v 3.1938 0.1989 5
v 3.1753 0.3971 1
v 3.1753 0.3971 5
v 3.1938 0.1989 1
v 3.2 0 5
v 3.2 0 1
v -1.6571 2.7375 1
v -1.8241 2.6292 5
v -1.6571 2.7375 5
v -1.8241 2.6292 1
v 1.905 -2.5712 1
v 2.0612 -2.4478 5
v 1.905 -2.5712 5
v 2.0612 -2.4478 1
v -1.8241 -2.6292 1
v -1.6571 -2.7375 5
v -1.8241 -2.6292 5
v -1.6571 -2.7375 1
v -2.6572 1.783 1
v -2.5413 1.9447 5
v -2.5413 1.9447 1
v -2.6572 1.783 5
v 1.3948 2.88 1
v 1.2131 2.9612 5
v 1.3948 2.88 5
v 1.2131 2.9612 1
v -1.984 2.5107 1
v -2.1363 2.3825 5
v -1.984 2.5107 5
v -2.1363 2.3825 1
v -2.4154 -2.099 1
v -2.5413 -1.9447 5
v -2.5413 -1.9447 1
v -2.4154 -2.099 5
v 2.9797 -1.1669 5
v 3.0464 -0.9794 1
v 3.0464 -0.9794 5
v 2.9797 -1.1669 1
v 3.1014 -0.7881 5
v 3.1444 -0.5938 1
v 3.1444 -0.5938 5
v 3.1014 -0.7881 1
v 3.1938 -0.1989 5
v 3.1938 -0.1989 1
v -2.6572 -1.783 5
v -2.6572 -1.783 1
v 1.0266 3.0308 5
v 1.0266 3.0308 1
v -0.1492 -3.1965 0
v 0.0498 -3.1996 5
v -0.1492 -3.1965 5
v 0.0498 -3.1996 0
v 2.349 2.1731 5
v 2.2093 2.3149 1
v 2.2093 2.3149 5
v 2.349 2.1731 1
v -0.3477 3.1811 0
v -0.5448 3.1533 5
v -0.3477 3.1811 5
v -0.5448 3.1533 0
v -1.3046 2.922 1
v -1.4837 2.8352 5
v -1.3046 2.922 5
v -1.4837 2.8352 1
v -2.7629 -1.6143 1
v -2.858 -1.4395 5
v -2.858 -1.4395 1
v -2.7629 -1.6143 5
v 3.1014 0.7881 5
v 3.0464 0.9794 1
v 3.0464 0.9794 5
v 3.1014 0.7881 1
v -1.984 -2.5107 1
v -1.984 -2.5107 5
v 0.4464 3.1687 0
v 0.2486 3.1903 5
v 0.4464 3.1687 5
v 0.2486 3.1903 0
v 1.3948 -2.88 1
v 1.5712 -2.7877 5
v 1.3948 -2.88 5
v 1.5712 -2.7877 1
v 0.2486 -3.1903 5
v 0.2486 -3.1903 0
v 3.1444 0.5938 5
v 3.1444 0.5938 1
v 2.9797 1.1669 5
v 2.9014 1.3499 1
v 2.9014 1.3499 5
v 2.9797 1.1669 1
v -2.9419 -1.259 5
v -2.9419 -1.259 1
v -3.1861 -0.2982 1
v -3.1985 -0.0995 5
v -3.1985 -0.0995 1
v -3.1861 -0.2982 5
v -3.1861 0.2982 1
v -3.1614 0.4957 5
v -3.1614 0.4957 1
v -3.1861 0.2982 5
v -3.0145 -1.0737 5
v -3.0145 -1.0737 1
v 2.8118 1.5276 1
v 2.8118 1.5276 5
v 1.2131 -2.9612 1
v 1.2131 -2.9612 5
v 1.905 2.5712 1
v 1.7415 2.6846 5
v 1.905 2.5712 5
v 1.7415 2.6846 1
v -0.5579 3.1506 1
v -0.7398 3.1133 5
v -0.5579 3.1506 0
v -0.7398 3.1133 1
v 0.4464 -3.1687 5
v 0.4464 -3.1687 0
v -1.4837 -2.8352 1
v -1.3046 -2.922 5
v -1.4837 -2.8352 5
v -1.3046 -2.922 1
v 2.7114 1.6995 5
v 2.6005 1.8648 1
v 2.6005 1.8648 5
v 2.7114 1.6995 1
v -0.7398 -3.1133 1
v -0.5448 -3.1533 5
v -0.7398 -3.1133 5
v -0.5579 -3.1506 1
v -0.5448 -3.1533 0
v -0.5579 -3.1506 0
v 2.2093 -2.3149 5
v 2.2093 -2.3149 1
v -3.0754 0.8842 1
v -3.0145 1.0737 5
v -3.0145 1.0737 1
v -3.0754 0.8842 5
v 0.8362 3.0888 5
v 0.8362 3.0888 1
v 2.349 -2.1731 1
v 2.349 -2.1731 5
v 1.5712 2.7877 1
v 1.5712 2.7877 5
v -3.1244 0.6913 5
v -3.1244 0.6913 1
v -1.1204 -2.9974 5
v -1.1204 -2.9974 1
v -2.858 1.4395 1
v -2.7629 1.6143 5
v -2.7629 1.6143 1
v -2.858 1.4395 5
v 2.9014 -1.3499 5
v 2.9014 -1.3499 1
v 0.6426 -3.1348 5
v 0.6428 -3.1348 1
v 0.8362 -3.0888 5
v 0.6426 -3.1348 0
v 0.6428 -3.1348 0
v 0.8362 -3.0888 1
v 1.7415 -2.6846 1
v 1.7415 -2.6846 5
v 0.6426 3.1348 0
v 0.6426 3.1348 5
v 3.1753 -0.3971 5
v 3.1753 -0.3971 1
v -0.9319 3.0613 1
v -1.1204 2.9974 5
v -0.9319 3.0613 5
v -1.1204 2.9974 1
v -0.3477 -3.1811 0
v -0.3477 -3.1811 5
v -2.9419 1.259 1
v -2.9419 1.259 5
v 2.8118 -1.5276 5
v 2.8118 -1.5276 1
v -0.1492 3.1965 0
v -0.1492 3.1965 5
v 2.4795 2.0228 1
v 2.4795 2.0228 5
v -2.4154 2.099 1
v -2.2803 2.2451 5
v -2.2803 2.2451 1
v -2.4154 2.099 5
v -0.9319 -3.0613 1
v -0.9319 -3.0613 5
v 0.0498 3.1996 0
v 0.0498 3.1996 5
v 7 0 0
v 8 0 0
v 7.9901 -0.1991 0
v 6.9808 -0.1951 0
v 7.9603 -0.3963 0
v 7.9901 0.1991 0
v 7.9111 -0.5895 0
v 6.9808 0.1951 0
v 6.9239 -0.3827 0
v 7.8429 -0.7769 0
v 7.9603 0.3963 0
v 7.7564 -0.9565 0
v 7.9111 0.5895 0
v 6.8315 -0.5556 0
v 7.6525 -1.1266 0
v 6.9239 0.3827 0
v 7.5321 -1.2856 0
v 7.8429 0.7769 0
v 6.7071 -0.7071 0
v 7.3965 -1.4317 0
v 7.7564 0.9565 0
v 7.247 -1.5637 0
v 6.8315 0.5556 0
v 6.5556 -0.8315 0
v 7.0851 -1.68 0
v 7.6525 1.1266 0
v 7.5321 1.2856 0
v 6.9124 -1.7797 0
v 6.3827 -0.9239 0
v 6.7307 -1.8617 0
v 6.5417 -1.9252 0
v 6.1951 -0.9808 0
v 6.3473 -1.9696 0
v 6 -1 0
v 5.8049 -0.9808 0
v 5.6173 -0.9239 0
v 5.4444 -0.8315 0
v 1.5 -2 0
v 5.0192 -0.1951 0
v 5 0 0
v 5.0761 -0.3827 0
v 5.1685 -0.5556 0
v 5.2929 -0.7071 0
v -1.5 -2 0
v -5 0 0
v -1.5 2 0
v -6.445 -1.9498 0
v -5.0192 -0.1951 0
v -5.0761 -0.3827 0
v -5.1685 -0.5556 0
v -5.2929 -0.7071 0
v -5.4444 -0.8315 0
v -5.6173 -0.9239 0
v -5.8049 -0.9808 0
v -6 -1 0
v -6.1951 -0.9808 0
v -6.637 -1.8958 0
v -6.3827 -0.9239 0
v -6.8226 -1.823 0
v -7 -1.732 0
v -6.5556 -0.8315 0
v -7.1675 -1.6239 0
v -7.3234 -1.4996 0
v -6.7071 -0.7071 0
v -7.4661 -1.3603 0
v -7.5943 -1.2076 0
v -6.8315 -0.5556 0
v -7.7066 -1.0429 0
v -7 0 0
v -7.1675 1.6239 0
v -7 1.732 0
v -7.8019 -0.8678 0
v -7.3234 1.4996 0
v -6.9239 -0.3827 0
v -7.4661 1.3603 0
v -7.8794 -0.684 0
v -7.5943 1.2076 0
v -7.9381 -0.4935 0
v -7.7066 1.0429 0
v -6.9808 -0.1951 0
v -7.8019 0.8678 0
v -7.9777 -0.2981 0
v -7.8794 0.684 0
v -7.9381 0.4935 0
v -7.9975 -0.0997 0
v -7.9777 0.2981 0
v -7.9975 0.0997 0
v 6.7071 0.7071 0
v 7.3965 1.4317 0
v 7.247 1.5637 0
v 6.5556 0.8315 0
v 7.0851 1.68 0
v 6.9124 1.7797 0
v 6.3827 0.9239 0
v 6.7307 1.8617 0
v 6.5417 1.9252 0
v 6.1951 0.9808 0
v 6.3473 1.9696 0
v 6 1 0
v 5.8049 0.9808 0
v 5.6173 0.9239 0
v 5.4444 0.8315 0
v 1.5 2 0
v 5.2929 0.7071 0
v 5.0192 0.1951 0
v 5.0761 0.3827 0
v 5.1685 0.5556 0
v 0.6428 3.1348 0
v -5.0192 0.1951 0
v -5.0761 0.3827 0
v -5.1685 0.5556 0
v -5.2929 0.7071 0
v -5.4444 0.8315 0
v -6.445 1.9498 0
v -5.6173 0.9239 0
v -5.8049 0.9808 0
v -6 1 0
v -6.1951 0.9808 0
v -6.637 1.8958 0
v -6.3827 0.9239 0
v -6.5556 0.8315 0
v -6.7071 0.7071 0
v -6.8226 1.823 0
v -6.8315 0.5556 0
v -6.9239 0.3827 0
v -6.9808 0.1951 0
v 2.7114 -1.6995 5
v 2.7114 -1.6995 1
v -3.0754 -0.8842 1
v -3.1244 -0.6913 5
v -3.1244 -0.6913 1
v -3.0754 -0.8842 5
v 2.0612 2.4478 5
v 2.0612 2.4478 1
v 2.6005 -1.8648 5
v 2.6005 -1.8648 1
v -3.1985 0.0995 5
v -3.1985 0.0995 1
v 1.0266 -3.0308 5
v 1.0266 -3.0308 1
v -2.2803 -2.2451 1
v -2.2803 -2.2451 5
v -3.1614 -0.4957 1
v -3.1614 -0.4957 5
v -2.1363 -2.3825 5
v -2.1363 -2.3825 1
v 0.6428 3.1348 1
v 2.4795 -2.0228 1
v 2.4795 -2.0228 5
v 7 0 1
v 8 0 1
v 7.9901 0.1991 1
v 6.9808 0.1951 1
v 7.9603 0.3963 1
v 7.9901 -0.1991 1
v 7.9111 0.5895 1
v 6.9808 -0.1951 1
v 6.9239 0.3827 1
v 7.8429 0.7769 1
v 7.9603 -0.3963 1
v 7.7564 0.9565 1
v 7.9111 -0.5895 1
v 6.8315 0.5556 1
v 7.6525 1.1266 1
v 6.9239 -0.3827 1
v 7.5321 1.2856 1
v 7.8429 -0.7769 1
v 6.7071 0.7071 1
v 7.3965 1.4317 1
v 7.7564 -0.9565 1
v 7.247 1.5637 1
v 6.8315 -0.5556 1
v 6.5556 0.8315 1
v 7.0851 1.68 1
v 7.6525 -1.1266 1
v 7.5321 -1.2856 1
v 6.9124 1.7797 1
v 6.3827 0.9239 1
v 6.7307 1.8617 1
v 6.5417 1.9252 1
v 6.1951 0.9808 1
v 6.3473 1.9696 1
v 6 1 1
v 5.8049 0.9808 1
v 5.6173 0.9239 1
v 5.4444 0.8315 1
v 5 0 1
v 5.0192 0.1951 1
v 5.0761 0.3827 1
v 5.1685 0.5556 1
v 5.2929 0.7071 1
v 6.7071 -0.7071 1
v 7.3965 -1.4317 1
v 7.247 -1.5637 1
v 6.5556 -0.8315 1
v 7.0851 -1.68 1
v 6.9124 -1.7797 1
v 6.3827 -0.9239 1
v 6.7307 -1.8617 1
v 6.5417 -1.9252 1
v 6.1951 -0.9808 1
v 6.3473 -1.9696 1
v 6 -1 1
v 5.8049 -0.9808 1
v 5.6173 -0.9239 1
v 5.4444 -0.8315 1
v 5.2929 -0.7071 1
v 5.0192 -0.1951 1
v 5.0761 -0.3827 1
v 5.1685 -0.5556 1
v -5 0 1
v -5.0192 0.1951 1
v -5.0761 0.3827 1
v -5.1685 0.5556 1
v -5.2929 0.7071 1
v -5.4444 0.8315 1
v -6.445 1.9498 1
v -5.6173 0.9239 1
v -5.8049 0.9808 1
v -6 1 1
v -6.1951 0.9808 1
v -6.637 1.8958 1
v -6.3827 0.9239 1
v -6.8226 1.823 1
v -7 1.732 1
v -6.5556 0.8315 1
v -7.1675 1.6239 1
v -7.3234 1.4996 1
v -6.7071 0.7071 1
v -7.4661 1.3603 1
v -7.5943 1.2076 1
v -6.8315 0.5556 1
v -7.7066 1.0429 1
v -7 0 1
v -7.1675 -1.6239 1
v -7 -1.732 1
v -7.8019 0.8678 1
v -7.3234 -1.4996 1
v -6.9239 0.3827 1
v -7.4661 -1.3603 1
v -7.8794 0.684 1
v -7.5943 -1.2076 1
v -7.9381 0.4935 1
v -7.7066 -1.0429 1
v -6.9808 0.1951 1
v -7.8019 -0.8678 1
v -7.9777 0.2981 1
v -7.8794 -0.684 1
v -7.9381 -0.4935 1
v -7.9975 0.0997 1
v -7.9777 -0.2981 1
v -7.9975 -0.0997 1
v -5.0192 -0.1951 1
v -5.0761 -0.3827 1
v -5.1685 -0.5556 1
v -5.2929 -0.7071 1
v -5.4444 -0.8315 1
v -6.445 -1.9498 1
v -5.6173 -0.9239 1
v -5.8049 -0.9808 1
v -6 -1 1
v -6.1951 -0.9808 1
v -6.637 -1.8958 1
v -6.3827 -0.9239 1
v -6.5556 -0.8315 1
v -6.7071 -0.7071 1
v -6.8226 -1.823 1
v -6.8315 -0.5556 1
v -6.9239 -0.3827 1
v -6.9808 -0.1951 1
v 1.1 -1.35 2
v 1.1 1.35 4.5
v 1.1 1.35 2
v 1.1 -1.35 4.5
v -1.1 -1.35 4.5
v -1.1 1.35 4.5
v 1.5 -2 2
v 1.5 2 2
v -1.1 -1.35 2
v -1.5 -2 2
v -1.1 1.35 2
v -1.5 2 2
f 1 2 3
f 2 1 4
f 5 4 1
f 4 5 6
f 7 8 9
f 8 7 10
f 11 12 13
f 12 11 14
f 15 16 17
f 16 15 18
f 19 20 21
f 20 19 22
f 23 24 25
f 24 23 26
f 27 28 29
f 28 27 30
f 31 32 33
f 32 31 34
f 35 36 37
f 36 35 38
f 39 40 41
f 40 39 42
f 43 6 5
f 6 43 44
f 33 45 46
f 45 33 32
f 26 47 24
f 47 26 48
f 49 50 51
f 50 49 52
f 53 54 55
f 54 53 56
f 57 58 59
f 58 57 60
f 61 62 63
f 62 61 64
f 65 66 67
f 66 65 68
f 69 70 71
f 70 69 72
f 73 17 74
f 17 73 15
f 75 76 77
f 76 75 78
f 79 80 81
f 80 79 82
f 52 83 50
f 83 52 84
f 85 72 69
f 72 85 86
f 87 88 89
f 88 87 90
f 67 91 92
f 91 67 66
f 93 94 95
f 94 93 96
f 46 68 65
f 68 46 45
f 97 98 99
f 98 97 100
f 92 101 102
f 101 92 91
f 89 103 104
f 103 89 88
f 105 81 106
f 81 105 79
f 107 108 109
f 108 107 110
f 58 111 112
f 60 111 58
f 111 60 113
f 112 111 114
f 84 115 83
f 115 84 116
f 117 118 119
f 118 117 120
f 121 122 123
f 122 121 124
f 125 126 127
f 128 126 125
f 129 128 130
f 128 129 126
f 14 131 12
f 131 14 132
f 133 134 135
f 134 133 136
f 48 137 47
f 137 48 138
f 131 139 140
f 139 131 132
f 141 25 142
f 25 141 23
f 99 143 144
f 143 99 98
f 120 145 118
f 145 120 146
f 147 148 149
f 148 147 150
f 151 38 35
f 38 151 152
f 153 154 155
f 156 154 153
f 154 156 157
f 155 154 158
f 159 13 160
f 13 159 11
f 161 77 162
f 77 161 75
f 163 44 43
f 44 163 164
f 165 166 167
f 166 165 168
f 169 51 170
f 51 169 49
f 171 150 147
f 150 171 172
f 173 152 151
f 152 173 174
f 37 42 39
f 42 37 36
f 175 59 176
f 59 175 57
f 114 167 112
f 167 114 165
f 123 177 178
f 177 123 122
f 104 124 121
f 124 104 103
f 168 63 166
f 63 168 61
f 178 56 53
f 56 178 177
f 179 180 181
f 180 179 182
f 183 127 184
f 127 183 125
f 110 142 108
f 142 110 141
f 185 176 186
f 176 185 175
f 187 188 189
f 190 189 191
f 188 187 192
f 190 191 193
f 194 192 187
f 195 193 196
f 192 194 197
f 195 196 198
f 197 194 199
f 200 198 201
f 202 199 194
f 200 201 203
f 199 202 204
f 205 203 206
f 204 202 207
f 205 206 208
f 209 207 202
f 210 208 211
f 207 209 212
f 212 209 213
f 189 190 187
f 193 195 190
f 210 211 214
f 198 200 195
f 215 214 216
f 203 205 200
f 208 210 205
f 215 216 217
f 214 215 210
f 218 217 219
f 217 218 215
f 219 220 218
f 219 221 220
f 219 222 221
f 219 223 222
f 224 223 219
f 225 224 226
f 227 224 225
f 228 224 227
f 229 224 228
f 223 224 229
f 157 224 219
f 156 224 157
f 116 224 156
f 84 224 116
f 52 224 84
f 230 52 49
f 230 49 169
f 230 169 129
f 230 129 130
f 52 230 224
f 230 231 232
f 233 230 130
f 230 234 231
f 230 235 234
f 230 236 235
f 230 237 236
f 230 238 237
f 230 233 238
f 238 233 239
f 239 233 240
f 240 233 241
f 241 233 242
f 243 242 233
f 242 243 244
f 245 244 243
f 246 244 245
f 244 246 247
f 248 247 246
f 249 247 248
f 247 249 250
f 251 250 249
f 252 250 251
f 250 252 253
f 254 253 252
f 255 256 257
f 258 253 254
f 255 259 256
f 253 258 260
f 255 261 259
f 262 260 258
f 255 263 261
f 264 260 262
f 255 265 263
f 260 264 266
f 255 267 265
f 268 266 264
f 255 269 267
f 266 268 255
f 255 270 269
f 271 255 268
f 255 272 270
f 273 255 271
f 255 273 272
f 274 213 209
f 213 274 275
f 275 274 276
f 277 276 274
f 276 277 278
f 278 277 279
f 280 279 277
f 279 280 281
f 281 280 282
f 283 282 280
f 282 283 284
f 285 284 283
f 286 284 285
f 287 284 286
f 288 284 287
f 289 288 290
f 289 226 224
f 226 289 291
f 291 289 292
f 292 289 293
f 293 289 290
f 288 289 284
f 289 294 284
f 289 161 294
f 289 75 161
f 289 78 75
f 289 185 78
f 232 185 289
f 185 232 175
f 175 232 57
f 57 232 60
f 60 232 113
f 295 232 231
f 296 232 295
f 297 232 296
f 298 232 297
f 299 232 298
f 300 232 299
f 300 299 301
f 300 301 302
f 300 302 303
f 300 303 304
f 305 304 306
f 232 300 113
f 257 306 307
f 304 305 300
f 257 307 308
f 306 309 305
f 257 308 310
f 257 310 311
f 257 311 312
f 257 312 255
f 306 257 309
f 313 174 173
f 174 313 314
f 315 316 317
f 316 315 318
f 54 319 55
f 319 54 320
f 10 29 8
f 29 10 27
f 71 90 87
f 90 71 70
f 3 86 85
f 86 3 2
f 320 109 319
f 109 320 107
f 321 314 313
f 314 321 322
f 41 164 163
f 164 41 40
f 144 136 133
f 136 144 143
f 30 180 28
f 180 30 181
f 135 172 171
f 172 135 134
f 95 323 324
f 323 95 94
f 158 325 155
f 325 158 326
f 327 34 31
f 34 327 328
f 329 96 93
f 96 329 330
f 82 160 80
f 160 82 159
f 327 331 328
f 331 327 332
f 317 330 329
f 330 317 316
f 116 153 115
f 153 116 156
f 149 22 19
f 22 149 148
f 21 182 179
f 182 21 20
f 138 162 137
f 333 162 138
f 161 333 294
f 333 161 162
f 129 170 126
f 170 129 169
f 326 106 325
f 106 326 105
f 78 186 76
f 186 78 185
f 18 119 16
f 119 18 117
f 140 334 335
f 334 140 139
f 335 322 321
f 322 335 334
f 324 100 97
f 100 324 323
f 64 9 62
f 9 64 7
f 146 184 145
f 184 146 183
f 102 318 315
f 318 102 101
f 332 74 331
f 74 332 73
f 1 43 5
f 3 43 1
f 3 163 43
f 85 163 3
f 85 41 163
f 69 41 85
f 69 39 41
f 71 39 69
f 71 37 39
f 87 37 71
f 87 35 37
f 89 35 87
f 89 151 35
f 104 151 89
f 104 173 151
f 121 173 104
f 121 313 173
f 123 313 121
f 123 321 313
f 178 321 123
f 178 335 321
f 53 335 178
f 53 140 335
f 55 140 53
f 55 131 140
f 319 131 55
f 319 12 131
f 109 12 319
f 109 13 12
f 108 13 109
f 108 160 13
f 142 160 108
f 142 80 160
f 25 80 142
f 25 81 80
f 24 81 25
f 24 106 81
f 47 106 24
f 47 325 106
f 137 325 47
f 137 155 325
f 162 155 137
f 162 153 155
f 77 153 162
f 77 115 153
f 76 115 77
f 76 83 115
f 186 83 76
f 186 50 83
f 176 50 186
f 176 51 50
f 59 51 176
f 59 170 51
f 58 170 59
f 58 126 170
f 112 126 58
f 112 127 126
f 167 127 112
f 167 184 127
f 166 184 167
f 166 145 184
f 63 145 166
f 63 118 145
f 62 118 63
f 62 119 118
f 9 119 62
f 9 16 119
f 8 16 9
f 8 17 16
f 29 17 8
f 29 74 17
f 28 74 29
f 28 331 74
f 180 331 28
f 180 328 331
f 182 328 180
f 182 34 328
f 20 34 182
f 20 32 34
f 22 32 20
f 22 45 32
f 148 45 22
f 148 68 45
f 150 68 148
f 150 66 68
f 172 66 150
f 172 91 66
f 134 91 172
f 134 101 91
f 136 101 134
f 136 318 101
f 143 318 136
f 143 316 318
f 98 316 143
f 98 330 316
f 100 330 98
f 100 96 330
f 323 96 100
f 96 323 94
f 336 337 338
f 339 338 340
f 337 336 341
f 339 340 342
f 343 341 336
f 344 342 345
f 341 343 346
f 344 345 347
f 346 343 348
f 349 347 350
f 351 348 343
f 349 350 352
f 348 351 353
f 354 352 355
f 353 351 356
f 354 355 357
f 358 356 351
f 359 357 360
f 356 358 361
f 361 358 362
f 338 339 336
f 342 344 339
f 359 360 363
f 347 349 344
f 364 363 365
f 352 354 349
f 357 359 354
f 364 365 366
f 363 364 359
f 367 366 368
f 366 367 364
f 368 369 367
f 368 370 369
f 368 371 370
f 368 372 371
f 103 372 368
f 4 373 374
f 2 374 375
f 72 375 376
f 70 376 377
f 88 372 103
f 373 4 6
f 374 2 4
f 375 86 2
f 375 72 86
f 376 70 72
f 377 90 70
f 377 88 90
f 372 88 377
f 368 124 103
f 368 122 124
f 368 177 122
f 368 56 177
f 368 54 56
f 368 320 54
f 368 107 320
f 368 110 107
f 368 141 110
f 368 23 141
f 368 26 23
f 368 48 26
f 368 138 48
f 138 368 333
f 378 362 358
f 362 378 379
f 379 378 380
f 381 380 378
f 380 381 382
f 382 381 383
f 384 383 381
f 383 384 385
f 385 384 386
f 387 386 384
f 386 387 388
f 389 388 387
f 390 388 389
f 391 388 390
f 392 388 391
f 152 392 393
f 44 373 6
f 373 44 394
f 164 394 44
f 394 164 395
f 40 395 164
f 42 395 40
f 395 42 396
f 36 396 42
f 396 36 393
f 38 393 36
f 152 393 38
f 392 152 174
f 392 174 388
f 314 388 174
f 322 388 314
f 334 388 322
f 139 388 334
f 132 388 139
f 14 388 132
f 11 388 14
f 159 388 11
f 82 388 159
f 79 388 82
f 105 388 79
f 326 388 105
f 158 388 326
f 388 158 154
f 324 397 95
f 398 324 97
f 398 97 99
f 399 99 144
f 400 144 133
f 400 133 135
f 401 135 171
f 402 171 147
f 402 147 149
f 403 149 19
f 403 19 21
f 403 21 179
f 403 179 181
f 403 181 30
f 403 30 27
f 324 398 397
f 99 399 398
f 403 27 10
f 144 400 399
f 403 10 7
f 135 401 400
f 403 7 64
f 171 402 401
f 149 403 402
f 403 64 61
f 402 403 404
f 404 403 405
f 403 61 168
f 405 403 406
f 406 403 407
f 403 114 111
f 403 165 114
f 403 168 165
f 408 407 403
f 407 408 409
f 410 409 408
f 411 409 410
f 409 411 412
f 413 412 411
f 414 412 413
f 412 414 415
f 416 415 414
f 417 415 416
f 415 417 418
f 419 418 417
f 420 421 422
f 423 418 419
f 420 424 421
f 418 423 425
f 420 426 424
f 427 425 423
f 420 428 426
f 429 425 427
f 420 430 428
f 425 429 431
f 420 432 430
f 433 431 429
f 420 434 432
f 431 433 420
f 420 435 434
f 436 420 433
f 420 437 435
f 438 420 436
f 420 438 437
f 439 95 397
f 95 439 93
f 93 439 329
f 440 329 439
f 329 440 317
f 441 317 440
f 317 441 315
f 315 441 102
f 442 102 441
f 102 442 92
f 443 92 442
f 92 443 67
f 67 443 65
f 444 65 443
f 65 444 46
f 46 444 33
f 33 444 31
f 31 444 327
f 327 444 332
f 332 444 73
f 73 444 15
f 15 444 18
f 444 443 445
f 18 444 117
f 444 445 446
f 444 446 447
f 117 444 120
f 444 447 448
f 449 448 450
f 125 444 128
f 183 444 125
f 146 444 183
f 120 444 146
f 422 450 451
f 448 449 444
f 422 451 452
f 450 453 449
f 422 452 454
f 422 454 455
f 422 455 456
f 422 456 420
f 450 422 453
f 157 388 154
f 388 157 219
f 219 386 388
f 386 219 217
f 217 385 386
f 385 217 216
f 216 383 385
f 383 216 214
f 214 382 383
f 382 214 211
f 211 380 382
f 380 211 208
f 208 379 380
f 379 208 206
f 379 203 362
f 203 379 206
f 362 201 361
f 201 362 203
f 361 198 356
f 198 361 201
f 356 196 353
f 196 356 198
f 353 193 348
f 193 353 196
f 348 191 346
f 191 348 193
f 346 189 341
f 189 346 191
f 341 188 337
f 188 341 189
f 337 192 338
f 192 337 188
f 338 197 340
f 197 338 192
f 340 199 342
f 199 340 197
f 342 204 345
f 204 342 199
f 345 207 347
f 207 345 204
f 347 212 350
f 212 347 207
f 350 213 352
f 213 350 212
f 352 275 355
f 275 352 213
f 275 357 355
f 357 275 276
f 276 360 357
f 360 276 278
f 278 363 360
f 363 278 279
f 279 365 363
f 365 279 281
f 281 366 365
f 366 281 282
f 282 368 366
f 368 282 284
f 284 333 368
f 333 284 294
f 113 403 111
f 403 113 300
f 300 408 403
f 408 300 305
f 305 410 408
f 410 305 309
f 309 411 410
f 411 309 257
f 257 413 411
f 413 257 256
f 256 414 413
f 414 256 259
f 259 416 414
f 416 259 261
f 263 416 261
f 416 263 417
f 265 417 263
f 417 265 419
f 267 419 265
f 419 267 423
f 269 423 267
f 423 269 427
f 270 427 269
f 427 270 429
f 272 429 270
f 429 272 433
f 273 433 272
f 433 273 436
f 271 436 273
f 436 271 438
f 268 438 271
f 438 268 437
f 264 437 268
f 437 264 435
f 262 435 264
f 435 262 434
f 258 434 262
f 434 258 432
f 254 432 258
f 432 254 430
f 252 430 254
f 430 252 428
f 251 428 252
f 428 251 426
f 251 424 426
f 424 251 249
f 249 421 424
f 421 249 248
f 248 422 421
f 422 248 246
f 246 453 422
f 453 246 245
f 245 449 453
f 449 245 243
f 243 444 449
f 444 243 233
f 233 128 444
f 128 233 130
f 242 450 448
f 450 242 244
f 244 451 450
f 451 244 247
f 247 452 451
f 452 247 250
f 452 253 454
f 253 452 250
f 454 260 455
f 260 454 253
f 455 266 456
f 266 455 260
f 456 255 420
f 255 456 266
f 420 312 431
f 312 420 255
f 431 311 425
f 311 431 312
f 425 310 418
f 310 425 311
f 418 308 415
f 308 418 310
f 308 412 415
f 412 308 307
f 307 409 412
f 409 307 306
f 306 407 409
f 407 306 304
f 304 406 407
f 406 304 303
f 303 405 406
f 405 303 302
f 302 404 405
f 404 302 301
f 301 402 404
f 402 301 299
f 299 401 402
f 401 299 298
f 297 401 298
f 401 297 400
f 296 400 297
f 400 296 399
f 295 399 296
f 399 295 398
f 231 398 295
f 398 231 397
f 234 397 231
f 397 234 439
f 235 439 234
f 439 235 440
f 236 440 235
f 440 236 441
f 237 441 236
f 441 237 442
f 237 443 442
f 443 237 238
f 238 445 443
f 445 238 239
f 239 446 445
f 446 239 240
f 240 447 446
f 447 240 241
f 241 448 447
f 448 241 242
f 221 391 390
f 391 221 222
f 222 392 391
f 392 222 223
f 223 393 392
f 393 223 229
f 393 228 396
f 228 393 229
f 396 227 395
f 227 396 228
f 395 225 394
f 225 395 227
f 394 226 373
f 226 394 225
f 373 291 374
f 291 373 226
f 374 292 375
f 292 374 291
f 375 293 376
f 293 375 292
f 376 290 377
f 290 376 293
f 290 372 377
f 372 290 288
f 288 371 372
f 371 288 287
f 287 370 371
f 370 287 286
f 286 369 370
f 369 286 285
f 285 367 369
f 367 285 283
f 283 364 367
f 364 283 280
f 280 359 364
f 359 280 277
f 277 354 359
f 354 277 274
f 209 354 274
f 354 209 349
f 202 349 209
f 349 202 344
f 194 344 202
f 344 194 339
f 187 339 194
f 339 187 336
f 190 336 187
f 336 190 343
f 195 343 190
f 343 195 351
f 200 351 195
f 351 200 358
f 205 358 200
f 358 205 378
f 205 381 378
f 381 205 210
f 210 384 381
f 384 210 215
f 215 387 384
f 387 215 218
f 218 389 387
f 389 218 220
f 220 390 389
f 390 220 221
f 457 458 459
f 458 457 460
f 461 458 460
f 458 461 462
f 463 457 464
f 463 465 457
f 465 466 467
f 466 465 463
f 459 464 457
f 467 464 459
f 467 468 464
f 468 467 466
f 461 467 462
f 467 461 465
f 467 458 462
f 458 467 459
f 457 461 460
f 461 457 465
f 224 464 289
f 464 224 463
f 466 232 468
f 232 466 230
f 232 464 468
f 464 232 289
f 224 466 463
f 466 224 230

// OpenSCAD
$fa = 0.2;
$fs = 0.2;




btn_d = 6.4;
btn_h = 5;
btn_pin_offset = 6;
btn_pin_d = 2;

sm_dim = [2.2, 2.7, 2.5];
se_dim = [3, 4, 2.5];

difference() { 
union() {
cylinder(d = btn_d, h = btn_h);
    linear_extrude(1)

difference() {
hull() {
translate([-btn_pin_offset,0,0])
circle(d = 4);

circle(d = btn_d);

translate([btn_pin_offset,0,0])
circle(d = 4);
}
    
    translate([-btn_pin_offset,0])
        circle(d = btn_pin_d);

    translate([btn_pin_offset,0])
        circle(d = btn_pin_d);
}
}

translate([0,0,-0.5]) {

union() {
translate([-sm_dim[0]/2, -sm_dim[1]/2,se_dim[2]])
cube(sm_dim);
translate([-se_dim[0]/2, -se_dim[1]/2,0])
cube(se_dim);
}
}

}
